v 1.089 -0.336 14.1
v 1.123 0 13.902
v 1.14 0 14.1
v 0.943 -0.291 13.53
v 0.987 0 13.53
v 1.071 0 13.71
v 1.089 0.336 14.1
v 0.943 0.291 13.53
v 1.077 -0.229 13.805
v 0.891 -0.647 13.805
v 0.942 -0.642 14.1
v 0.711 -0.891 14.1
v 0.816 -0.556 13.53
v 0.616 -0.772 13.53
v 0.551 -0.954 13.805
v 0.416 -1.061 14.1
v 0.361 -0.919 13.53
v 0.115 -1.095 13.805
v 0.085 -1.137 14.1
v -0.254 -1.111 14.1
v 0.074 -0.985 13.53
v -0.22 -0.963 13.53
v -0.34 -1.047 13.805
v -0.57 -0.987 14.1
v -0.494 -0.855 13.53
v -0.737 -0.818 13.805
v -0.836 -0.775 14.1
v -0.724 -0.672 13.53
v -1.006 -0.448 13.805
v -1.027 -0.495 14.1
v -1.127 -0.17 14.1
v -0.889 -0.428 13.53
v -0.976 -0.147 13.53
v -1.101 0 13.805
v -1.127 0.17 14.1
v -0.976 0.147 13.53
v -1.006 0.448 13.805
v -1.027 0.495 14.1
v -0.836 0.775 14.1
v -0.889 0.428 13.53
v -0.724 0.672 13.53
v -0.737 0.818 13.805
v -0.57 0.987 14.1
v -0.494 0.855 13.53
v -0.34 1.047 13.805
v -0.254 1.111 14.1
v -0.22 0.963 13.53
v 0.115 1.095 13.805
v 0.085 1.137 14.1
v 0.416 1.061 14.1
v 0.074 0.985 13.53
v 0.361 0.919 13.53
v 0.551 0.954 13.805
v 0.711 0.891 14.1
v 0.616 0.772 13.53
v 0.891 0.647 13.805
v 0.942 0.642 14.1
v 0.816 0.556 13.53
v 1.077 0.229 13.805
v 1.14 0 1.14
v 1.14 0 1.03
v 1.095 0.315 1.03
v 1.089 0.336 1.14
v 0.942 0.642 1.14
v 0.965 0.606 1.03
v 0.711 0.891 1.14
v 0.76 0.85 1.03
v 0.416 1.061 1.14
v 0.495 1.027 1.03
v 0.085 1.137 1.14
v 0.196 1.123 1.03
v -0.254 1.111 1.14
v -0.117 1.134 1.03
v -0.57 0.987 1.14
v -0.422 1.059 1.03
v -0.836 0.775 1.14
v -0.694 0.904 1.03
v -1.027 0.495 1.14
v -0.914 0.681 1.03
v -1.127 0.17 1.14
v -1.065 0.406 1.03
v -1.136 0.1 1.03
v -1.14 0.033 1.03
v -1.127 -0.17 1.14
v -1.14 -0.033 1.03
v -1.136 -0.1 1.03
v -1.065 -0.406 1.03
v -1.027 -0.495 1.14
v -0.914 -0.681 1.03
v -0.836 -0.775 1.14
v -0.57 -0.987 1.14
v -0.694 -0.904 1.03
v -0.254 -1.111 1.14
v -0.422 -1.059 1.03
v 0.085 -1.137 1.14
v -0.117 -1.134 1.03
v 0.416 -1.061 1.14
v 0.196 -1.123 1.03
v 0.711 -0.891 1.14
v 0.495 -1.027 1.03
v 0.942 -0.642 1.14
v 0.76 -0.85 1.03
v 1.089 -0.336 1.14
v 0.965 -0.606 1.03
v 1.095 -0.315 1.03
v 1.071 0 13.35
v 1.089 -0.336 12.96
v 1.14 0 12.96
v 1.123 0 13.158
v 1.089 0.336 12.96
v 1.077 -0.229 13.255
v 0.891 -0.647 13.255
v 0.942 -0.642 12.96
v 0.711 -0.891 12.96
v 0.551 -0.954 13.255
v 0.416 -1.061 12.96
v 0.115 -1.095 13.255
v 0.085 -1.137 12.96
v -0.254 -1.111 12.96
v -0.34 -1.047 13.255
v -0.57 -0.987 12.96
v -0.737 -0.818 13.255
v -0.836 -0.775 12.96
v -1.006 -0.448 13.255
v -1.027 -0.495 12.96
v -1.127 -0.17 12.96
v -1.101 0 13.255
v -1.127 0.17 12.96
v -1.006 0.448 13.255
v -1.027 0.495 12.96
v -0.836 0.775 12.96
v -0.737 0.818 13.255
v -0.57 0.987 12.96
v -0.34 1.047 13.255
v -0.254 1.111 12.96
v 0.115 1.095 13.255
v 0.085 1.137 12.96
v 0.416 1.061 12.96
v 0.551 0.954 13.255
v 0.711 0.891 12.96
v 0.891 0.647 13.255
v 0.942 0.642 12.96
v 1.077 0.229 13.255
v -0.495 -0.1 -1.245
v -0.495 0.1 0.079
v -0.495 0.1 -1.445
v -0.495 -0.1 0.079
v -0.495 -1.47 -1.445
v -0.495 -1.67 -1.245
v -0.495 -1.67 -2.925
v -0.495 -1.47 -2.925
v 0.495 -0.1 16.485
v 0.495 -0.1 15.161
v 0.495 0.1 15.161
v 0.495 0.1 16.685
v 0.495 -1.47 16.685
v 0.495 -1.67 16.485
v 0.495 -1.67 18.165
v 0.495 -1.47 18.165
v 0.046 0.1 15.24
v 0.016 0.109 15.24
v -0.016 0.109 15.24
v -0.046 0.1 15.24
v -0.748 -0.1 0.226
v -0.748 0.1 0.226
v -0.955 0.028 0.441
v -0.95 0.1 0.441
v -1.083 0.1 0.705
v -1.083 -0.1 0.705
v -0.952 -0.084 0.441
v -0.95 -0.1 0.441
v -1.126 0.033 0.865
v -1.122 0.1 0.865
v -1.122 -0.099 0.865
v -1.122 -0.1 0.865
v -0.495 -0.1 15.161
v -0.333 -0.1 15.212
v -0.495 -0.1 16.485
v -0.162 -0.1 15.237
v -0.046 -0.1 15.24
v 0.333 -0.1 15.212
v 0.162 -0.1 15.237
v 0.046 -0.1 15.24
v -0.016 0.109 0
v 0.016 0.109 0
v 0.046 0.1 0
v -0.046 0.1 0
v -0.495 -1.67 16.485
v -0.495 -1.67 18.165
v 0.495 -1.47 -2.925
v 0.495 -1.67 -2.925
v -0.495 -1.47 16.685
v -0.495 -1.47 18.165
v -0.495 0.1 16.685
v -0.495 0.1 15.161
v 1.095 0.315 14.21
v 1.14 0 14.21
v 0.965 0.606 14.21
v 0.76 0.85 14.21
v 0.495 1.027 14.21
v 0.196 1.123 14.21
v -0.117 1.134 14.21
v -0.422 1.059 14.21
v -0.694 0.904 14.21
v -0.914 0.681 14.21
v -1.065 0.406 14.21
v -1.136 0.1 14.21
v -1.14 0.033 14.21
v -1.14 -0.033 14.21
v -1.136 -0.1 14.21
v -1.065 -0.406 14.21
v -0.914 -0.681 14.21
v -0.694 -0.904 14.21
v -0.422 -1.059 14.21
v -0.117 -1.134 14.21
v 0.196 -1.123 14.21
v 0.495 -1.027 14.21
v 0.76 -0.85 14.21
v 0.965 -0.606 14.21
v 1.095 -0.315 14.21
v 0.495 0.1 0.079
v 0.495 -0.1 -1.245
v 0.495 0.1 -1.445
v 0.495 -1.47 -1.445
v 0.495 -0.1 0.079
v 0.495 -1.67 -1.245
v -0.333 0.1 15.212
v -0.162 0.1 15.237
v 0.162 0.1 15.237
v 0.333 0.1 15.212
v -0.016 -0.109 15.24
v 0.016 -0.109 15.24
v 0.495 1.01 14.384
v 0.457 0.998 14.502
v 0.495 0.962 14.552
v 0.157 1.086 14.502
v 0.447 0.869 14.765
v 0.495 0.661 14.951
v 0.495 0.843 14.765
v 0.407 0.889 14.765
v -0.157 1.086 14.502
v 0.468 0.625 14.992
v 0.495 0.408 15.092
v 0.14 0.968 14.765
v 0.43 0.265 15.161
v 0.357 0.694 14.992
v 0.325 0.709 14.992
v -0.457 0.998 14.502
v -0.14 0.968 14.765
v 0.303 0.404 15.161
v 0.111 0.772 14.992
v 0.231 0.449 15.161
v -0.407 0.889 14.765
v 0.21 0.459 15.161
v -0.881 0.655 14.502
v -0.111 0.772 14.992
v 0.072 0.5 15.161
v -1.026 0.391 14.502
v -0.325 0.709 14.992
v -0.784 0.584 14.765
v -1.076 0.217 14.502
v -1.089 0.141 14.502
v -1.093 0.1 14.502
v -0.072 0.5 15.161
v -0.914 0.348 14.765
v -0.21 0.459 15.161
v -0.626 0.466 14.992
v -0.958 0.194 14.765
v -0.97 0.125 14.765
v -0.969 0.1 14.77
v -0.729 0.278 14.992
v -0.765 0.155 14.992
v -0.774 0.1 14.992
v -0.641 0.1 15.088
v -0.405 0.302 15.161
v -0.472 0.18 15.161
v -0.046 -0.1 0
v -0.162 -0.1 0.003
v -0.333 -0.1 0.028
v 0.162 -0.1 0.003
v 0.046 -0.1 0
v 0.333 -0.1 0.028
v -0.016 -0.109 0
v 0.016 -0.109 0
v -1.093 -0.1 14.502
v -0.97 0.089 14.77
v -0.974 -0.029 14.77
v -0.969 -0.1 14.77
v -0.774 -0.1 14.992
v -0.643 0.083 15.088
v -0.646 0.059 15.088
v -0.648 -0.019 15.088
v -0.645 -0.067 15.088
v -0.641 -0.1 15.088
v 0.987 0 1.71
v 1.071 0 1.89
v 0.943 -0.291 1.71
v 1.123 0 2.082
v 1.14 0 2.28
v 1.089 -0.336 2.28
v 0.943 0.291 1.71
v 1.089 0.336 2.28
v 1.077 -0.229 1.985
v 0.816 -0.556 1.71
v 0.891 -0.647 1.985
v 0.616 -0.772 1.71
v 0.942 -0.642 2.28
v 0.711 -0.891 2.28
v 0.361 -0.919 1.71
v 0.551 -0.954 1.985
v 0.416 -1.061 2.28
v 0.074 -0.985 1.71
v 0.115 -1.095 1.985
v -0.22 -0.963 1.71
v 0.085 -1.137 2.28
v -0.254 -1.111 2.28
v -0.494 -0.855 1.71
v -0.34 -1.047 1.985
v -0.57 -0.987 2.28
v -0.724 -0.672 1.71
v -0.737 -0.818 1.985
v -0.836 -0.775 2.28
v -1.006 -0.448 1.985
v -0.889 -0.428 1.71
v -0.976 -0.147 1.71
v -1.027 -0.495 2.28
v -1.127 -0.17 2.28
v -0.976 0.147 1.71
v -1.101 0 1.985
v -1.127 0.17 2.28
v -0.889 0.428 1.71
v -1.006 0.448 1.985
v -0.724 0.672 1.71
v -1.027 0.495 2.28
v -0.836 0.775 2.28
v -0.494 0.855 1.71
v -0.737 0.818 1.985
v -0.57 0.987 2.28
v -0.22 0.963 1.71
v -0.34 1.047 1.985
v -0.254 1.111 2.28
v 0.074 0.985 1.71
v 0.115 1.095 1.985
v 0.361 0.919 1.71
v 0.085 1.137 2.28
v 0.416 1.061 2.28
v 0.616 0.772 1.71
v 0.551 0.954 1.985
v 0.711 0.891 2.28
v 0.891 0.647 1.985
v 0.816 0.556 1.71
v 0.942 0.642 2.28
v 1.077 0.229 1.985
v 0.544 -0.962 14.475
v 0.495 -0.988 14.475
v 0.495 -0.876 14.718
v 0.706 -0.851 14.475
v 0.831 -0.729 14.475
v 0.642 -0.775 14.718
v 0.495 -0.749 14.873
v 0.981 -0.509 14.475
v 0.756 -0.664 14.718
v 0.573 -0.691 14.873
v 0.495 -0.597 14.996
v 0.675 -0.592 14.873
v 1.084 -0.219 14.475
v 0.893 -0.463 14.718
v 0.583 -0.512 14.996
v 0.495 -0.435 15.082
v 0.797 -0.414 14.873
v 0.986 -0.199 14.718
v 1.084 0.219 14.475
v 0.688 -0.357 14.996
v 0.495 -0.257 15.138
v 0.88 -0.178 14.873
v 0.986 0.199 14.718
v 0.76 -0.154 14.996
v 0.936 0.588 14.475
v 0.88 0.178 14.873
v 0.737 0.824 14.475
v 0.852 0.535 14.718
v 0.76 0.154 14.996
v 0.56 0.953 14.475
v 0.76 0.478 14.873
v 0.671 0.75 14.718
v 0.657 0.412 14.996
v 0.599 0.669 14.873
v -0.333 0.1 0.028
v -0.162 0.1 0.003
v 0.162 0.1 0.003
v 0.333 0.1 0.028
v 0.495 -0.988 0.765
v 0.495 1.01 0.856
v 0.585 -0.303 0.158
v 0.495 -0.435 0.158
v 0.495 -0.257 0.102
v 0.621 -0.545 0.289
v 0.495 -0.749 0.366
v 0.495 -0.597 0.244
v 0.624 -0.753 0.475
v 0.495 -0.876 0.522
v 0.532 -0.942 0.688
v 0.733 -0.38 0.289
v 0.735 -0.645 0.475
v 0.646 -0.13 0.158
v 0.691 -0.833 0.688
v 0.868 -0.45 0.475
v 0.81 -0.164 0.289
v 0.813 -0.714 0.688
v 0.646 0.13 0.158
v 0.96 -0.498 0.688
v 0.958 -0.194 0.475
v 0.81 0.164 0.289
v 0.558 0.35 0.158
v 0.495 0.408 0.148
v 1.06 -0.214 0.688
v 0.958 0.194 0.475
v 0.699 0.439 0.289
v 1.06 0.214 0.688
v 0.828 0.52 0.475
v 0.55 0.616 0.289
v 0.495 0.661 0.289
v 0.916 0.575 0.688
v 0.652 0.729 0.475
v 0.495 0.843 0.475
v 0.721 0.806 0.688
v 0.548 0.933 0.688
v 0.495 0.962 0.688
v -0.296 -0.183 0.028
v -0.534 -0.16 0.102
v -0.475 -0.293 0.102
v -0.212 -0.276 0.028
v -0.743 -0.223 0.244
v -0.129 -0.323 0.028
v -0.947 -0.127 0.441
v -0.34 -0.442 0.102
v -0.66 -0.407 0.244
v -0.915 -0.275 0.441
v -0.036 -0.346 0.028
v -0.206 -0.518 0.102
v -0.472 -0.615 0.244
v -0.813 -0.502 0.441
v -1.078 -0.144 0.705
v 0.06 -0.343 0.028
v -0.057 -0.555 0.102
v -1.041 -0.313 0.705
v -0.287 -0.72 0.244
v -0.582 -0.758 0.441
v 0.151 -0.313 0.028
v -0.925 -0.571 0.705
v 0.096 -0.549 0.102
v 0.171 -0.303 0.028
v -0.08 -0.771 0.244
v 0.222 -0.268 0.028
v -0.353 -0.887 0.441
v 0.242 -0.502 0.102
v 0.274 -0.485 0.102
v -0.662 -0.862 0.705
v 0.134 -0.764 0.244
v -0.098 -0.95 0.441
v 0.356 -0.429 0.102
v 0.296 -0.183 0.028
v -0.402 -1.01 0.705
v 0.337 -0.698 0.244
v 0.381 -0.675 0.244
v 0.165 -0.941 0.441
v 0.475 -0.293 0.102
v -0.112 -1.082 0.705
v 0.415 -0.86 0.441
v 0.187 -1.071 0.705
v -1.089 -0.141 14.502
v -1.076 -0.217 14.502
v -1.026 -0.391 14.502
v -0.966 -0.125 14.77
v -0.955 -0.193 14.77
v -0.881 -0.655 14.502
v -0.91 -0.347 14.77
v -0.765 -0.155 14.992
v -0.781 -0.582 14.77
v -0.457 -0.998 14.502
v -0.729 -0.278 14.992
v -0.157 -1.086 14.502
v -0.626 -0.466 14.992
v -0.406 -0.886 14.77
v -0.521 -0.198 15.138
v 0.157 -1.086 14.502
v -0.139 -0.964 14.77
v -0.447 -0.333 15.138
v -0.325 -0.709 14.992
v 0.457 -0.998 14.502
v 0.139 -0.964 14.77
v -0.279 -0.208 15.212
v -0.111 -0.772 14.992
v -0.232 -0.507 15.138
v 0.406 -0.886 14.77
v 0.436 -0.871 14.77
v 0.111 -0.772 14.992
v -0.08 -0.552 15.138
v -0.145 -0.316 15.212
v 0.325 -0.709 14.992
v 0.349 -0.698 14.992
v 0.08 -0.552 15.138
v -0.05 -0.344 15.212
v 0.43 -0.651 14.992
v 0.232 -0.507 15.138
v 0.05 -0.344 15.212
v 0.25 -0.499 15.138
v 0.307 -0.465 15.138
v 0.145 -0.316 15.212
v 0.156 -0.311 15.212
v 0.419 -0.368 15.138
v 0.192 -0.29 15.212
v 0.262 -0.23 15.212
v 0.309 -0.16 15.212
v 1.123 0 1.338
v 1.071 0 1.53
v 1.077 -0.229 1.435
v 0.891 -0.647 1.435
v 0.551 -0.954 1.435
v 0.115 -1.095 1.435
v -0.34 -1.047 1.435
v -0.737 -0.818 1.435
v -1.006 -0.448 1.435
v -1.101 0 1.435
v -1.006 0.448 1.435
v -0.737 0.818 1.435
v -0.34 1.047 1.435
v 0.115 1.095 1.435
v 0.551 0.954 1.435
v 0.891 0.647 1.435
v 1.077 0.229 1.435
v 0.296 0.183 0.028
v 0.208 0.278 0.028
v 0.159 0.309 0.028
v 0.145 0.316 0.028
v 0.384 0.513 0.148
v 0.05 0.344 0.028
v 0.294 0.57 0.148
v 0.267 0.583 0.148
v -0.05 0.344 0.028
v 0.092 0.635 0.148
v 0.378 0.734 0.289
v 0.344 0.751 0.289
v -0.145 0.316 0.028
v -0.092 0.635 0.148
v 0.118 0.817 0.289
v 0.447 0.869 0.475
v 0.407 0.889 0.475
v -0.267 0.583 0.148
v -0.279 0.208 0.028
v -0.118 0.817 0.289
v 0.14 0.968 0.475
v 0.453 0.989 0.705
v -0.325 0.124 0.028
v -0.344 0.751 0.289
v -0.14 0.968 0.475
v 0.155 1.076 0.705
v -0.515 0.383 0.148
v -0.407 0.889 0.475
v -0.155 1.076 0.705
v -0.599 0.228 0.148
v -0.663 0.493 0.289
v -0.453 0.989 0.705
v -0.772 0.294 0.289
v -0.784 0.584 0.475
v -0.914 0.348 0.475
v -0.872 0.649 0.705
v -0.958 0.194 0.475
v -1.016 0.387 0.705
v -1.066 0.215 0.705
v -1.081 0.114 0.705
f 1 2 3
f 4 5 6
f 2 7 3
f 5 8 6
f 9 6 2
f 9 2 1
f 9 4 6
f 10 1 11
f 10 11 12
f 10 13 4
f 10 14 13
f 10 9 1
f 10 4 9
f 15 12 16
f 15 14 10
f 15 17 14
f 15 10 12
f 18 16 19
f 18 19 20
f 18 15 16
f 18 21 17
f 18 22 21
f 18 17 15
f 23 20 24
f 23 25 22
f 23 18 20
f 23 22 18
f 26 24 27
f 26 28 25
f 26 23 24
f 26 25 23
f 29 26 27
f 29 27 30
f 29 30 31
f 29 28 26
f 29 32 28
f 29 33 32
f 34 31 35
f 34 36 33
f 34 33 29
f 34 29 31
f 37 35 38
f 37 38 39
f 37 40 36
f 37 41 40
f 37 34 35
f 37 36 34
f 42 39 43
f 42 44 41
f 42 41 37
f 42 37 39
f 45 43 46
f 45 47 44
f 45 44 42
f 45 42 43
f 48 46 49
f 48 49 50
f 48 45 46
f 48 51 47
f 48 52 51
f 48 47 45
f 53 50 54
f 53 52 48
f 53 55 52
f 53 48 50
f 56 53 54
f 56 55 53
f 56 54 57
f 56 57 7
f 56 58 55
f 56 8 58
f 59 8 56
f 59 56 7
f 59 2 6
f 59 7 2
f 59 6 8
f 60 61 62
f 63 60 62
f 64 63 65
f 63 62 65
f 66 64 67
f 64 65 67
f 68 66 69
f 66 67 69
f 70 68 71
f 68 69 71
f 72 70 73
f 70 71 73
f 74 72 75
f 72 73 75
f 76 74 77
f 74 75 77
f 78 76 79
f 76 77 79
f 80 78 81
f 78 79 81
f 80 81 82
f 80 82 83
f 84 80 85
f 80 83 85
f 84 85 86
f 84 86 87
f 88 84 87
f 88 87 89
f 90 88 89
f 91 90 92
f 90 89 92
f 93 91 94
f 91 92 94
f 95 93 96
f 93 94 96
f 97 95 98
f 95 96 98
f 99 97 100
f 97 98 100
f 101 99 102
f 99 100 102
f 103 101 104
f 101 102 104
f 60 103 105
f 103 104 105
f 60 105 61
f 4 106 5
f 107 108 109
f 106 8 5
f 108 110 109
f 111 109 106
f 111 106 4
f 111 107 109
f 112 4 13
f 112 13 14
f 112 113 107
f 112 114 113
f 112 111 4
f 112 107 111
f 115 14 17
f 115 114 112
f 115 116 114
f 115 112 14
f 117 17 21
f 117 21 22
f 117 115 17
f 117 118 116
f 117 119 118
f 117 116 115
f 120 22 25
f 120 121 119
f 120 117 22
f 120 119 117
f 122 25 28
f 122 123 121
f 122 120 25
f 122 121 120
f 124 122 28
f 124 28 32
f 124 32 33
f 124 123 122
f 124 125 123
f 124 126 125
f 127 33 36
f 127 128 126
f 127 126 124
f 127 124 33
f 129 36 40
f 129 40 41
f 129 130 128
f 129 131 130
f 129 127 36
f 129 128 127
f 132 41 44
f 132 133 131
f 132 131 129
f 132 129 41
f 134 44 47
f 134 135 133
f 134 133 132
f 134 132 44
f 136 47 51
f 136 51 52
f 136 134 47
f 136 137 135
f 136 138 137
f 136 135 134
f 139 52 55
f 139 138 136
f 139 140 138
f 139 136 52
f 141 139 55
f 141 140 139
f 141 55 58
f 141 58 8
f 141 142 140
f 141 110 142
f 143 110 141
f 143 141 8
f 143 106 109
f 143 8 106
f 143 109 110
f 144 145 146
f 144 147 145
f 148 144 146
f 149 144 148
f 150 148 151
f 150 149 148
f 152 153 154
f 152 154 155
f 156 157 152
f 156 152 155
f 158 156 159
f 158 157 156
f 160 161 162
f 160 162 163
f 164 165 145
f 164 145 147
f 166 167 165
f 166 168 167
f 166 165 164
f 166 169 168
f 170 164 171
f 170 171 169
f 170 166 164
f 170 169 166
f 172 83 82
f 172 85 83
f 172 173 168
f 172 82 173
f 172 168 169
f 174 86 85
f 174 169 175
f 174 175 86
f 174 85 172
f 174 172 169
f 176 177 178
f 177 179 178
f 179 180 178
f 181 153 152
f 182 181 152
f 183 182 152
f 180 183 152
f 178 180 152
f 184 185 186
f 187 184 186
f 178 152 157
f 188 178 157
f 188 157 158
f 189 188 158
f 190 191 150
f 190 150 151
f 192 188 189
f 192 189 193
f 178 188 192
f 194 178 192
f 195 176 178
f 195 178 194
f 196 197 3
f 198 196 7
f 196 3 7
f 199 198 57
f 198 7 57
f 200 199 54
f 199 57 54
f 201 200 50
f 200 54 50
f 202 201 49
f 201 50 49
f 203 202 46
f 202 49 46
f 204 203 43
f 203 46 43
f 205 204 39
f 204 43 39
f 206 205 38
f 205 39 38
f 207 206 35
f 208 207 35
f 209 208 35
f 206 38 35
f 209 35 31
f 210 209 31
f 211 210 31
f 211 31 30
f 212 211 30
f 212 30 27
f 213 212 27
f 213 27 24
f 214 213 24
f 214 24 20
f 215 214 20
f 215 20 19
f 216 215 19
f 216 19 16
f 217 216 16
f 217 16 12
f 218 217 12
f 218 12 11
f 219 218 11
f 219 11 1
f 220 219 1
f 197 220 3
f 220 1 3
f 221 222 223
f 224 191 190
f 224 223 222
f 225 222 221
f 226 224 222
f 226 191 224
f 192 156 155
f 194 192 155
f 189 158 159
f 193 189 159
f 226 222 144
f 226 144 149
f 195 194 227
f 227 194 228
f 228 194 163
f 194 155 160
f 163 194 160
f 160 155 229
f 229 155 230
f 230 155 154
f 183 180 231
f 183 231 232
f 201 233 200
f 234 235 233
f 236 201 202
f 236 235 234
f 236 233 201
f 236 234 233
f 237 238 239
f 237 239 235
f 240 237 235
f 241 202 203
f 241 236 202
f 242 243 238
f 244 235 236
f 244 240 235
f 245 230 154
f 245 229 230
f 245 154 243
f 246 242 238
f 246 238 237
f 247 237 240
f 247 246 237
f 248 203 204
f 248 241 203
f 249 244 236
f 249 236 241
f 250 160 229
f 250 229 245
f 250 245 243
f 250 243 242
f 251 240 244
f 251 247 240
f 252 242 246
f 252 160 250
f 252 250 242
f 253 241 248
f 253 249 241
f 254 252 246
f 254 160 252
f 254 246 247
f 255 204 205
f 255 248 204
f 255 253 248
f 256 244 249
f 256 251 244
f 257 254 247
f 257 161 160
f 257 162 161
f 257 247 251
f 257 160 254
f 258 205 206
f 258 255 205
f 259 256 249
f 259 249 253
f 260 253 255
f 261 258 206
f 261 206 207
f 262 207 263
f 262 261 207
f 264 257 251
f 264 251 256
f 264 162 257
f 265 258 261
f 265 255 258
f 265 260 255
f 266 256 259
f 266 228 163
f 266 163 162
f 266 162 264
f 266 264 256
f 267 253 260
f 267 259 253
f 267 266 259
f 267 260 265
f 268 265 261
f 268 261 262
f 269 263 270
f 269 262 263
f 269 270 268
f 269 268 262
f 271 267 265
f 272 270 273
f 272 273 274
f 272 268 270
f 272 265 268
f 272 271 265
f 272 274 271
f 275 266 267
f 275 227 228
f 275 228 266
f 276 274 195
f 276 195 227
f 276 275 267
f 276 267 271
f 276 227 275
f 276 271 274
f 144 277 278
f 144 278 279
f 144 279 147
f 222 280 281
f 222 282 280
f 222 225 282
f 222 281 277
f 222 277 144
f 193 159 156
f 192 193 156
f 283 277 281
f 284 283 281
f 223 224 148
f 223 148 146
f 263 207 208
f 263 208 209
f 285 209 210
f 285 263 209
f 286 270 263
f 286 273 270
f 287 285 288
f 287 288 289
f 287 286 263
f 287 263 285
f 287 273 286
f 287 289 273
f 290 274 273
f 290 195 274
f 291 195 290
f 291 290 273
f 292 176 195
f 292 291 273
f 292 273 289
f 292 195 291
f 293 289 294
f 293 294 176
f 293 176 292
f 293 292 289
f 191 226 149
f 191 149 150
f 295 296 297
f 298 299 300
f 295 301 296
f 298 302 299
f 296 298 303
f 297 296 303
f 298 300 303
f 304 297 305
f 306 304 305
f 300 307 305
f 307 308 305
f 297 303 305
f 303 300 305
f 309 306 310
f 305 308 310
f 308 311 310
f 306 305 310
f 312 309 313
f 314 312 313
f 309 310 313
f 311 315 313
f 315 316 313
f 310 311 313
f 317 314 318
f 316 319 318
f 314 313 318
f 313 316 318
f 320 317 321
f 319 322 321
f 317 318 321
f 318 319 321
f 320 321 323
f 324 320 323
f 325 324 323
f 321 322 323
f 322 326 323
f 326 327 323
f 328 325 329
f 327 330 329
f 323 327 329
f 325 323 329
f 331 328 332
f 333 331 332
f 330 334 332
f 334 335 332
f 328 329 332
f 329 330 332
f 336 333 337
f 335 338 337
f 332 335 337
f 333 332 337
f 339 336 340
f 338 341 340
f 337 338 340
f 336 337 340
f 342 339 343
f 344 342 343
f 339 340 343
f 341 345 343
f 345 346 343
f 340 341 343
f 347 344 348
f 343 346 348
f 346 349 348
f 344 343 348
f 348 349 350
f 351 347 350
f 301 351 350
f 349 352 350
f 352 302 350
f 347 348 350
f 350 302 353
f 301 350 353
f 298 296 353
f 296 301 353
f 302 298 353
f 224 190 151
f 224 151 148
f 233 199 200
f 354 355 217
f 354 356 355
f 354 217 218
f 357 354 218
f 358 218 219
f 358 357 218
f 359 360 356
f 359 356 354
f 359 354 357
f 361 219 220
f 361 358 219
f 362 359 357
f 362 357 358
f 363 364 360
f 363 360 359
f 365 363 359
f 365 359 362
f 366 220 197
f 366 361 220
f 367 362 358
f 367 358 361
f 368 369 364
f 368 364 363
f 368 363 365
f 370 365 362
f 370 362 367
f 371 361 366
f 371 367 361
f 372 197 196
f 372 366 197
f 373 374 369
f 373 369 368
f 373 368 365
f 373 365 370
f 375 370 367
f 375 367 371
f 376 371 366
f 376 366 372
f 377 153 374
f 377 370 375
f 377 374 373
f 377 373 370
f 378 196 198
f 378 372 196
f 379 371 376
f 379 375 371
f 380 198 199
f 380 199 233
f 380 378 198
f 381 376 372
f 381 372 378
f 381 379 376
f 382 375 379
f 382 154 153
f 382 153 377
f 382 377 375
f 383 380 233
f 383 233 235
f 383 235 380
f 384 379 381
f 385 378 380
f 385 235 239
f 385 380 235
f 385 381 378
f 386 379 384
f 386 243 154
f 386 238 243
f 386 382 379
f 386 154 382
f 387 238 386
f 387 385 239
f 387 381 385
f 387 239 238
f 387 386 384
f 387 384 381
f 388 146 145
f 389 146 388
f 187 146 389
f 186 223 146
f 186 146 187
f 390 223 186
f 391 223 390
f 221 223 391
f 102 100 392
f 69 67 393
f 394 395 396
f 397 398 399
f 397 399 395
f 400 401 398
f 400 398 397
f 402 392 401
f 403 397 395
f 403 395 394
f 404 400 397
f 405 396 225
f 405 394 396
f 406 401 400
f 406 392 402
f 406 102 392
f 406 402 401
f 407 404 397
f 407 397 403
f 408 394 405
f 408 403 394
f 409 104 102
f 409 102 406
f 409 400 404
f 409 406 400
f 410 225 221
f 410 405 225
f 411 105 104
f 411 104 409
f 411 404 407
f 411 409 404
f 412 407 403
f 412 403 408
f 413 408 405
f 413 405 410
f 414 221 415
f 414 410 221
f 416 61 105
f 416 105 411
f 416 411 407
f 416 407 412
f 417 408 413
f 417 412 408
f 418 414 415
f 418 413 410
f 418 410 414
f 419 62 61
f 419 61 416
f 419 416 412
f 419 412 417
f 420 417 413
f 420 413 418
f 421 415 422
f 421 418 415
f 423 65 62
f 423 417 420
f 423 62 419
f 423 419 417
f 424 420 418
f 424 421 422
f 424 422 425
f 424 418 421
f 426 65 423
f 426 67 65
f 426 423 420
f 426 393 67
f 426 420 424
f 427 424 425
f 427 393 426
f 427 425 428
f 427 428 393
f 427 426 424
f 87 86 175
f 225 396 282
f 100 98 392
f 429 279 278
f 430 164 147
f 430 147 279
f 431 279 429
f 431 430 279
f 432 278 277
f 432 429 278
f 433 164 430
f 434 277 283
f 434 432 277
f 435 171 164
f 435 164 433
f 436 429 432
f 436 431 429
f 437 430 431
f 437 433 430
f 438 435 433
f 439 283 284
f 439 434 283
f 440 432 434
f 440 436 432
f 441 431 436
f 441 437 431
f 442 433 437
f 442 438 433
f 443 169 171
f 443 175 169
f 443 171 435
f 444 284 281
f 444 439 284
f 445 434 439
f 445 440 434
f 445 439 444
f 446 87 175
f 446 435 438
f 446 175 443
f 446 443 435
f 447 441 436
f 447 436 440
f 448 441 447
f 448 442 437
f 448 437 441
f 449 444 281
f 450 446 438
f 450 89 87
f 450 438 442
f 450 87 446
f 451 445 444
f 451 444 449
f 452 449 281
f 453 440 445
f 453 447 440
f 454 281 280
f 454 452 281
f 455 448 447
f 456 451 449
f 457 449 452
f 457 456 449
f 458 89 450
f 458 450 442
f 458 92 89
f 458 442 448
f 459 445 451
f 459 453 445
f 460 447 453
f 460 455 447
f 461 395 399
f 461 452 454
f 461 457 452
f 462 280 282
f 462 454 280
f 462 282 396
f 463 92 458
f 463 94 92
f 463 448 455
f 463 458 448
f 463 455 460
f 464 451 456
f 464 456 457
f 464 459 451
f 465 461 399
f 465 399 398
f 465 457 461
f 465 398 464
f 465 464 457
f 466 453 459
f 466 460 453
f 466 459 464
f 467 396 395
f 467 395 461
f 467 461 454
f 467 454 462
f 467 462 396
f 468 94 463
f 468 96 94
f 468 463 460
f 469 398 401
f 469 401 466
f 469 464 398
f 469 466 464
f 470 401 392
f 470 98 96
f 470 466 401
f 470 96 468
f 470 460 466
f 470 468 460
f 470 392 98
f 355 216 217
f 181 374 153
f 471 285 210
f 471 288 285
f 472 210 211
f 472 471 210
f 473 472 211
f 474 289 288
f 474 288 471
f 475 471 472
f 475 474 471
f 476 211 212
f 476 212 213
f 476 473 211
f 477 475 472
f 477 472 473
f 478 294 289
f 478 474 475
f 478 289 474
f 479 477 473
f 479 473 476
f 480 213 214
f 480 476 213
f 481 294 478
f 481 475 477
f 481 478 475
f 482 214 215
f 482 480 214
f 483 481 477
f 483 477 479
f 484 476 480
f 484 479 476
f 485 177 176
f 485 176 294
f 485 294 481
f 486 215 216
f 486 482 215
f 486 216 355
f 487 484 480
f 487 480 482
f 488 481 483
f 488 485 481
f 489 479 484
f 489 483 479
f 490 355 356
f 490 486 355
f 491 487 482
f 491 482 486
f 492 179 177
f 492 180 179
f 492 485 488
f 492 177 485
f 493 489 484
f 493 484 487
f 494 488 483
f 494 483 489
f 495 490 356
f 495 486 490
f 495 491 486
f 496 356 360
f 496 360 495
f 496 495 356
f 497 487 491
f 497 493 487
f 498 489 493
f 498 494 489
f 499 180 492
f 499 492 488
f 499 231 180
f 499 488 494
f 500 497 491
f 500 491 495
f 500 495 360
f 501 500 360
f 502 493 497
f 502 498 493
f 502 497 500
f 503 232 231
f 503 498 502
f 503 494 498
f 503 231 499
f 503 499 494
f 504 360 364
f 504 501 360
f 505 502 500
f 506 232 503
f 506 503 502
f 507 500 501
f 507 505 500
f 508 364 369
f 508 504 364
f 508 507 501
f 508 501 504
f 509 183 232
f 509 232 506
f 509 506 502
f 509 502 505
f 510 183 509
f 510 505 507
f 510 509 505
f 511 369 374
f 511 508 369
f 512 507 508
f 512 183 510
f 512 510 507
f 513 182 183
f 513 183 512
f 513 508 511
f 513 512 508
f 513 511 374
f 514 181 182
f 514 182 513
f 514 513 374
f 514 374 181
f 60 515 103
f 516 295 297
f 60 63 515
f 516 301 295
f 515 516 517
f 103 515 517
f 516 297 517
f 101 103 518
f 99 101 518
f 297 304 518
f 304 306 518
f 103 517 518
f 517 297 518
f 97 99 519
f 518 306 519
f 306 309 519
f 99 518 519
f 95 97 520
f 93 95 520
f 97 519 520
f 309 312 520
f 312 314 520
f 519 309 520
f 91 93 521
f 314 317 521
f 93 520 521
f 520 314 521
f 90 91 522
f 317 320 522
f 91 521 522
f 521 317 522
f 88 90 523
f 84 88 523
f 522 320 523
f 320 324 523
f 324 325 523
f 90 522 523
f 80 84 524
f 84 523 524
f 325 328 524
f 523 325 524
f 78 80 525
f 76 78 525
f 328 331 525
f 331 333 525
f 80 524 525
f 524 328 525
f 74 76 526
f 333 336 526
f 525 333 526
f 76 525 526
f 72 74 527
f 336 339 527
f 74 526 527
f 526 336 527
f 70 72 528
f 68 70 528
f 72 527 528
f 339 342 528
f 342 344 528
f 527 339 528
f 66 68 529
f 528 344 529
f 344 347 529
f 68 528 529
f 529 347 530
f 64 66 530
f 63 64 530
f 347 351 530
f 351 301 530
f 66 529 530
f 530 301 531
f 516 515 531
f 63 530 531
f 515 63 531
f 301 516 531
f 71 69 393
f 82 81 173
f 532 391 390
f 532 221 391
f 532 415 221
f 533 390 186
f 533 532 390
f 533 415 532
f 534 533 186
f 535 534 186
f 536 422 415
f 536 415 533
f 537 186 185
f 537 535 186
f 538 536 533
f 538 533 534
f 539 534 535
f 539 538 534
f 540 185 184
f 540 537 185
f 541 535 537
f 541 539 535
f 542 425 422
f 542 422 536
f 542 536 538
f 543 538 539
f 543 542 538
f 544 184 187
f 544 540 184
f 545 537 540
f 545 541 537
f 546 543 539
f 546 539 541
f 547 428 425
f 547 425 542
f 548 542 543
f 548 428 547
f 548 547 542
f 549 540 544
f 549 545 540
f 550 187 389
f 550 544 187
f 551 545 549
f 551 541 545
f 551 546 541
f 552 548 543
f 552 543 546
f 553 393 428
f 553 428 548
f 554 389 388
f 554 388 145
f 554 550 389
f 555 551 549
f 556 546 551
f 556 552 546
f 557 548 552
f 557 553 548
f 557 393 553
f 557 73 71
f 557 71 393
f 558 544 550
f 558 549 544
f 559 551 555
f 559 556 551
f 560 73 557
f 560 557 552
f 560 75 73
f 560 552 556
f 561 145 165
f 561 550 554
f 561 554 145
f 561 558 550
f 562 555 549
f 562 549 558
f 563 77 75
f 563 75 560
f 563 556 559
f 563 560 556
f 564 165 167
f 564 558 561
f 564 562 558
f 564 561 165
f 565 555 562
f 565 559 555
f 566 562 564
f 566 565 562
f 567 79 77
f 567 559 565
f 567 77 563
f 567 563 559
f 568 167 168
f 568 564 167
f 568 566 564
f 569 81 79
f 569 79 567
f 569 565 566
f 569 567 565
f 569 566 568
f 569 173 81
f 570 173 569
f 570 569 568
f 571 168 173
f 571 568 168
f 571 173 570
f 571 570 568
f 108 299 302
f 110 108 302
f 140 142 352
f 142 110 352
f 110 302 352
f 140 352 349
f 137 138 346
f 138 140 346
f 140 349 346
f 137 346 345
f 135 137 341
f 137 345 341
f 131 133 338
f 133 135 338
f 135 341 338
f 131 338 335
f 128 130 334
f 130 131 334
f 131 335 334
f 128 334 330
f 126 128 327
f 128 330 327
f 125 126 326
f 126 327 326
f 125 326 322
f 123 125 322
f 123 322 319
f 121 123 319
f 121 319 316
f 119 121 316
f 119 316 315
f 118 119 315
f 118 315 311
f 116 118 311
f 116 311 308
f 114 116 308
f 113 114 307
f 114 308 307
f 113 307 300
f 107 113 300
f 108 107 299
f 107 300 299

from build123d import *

# Parameters (mm, degrees)
SKETCH1_R        = 1.14
EXTRUSION1_DEPTH = 15.24
EXTRUSION2_DEPTH = 0.495
FILLET3_R        = 1.03


with BuildPart() as part:
    # Sketch1 → Extrusion1 (new body)
    with BuildSketch(Plane.XY):
        Circle(SKETCH1_R)
    extrude(amount=EXTRUSION1_DEPTH)

    # Sketch3 → Revolution3 (revolve, cut)
    with BuildSketch(Plane.YZ, mode=Mode.PRIVATE) as revolution3_sk:
        with BuildLine():
            Line((1.14, 12.96), (1.14, 14.1))
            ThreePointArc((1.14, 14.1), (1.101155442, 13.804946289), (0.98726896, 13.53))
            ThreePointArc((0.98726896, 13.53), (1.101155442, 13.255053711), (1.14, 12.96))
        make_face()
    revolution3 = revolve(revolution3_sk.sketch.rotate(Axis((0, 0, 14.1), (0, 0, -1)), 90), axis=Axis((0, 0, 14.1), (0, 0, -1)), mode=Mode.SUBTRACT)

    # Mirror2: Revolution3 across plane
    add(revolution3.mirror(Plane.XY.offset(7.62)), mode=Mode.SUBTRACT)

    # Sketch4 → Extrusion2 (add, symmetric)
    with BuildSketch(Plane.YZ):
        with BuildLine():
            Line((-0.1, 0), (0, 0))
            ThreePointArc((0, 0), (-0.050048254, 0.001099138), (-0.1, 0.004394435))
            Line((-0.1, 0.004394435), (-0.1, 0))
        make_face()
        with BuildLine():
            ThreePointArc((0, 0), (0.050048254, 0.001099138), (0.1, 0.004394435))
            Line((0.1, 0.004394435), (0.1, 0.138771336))
            Line((0.1, 0.138771336), (-0.1, 0.138771336))
            Line((-0.1, 0.138771336), (-0.1, 0.004394435))
            ThreePointArc((-0.1, 0.004394435), (-0.050048254, 0.001099138), (0, 0))
        make_face()
        Polygon((0.1, -1.445), (0.1, 0), (0, 0), (-0.1, 0), (-0.1, -1.245), (-1.67, -1.245), (-1.67, -2.925), (-1.47, -2.925), (-1.47, -1.445), align=None)
    extrusion2 = extrude(amount=EXTRUSION2_DEPTH, both=True)

    # Mirror3: Extrusion2 across plane
    add(extrusion2.mirror(Plane.XY.offset(7.62)))

    # Fillet3
    # the kernel refuses this fillet: 1.03 mm, written as the material it takes off along each edge
    with BuildSketch(Plane(origin=(0, 0, 15.24), x_dir=(1, 0, 0), z_dir=(0, -1, 0))) as fillet3_piece_1_section:
        with BuildLine():
            CenterArc((1.14 - FILLET3_R, -FILLET3_R), FILLET3_R, 0, 90)
            Line((1.14 - FILLET3_R, 0), (1.14, 0))
            Line((1.14, 0), (1.14, -FILLET3_R))
        make_face()
    fillet3_piece_1 = revolve(axis=Axis((0, 0, 15.24), (0, 0, 1)), mode=Mode.PRIVATE)
    fillet3_piece_1 = split(fillet3_piece_1, bisect_by=Plane(origin=(0.495, 4e-09, 15.000808078), z_dir=(1, 0, 0)), keep=Keep.TOP, mode=Mode.PRIVATE)
    add(fillet3_piece_1, mode=Mode.SUBTRACT)
    with BuildSketch(Plane(origin=(0, 0, 15.24), x_dir=(1, 0, 0), z_dir=(0, -1, 0))) as fillet3_piece_2_section:
        with BuildLine():
            CenterArc((1.14 - FILLET3_R, -FILLET3_R), FILLET3_R, 0, 90)
            Line((1.14 - FILLET3_R, 0), (1.14, 0))
            Line((1.14, 0), (1.14, -FILLET3_R))
        make_face()
    fillet3_piece_2 = revolve(axis=Axis((0, 0, 15.24), (0, 0, 1)), mode=Mode.PRIVATE)
    fillet3_piece_2 = split(fillet3_piece_2, bisect_by=Plane(origin=(0, 0.1, 15.013614208), z_dir=(0, 1, 0)), keep=Keep.TOP, mode=Mode.PRIVATE)
    add(fillet3_piece_2, mode=Mode.SUBTRACT)
    with BuildSketch(Plane(origin=(0, 0, 15.24), x_dir=(1, 0, 0), z_dir=(0, -1, 0))) as fillet3_piece_3_section:
        with BuildLine():
            CenterArc((1.14 - FILLET3_R, -FILLET3_R), FILLET3_R, 0, 90)
            Line((1.14 - FILLET3_R, 0), (1.14, 0))
            Line((1.14, 0), (1.14, -FILLET3_R))
        make_face()
    fillet3_piece_3 = revolve(axis=Axis((0, 0, 15.24), (0, 0, 1)), mode=Mode.PRIVATE)
    fillet3_piece_3 = split(fillet3_piece_3, bisect_by=Plane(origin=(8e-09, -0.1, 15.013614602), z_dir=(0, -1, 0)), keep=Keep.TOP, mode=Mode.PRIVATE)
    add(fillet3_piece_3, mode=Mode.SUBTRACT)
    with BuildSketch(Plane(origin=(0, 0, 15.24), x_dir=(1, 0, 0), z_dir=(0, -1, 0))) as fillet3_piece_4_section:
        with BuildLine():
            CenterArc((1.14 - FILLET3_R, -FILLET3_R), FILLET3_R, 0, 90)
            Line((1.14 - FILLET3_R, 0), (1.14, 0))
            Line((1.14, 0), (1.14, -FILLET3_R))
        make_face()
    fillet3_piece_4 = revolve(axis=Axis((0, 0, 15.24), (0, 0, 1)), mode=Mode.PRIVATE)
    fillet3_piece_4 = split(fillet3_piece_4, bisect_by=Plane(origin=(-0.495, -1e-09, 15.000807979), z_dir=(-1, 0, 0)), keep=Keep.TOP, mode=Mode.PRIVATE)
    add(fillet3_piece_4, mode=Mode.SUBTRACT)
    with BuildSketch(Plane(origin=(0, 0, 0), x_dir=(1, 0, 0), z_dir=(0, -1, 0))) as fillet3_piece_5_section:
        with BuildLine():
            CenterArc((1.14 - FILLET3_R, FILLET3_R), FILLET3_R, 270, 90)
            Line((1.14 - FILLET3_R, 0), (1.14, 0))
            Line((1.14, 0), (1.14, FILLET3_R))
        make_face()
    fillet3_piece_5 = revolve(axis=Axis((0, 0, 0), (0, 0, 1)), mode=Mode.PRIVATE)
    fillet3_piece_5 = split(fillet3_piece_5, bisect_by=Plane(origin=(0.495, 4e-09, 0.239191922), z_dir=(1, 0, 0)), keep=Keep.TOP, mode=Mode.PRIVATE)
    add(fillet3_piece_5, mode=Mode.SUBTRACT)
    with BuildSketch(Plane(origin=(0, 0, 0), x_dir=(1, 0, 0), z_dir=(0, -1, 0))) as fillet3_piece_6_section:
        with BuildLine():
            CenterArc((1.14 - FILLET3_R, FILLET3_R), FILLET3_R, 270, 90)
            Line((1.14 - FILLET3_R, 0), (1.14, 0))
            Line((1.14, 0), (1.14, FILLET3_R))
        make_face()
    fillet3_piece_6 = revolve(axis=Axis((0, 0, 0), (0, 0, 1)), mode=Mode.PRIVATE)
    fillet3_piece_6 = split(fillet3_piece_6, bisect_by=Plane(origin=(0, 0.1, 0.226385792), z_dir=(0, 1, 0)), keep=Keep.TOP, mode=Mode.PRIVATE)
    add(fillet3_piece_6, mode=Mode.SUBTRACT)
    with BuildSketch(Plane(origin=(0, 0, 0), x_dir=(1, 0, 0), z_dir=(0, -1, 0))) as fillet3_piece_7_section:
        with BuildLine():
            CenterArc((1.14 - FILLET3_R, FILLET3_R), FILLET3_R, 270, 90)
            Line((1.14 - FILLET3_R, 0), (1.14, 0))
            Line((1.14, 0), (1.14, FILLET3_R))
        make_face()
    fillet3_piece_7 = revolve(axis=Axis((0, 0, 0), (0, 0, 1)), mode=Mode.PRIVATE)
    fillet3_piece_7 = split(fillet3_piece_7, bisect_by=Plane(origin=(8e-09, -0.1, 0.226385398), z_dir=(0, -1, 0)), keep=Keep.TOP, mode=Mode.PRIVATE)
    add(fillet3_piece_7, mode=Mode.SUBTRACT)
    with BuildSketch(Plane(origin=(0, 0, 0), x_dir=(1, 0, 0), z_dir=(0, -1, 0))) as fillet3_piece_8_section:
        with BuildLine():
            CenterArc((1.14 - FILLET3_R, FILLET3_R), FILLET3_R, 270, 90)
            Line((1.14 - FILLET3_R, 0), (1.14, 0))
            Line((1.14, 0), (1.14, FILLET3_R))
        make_face()
    fillet3_piece_8 = revolve(axis=Axis((0, 0, 0), (0, 0, 1)), mode=Mode.PRIVATE)
    fillet3_piece_8 = split(fillet3_piece_8, bisect_by=Plane(origin=(-0.495, -1e-09, 0.239192021), z_dir=(-1, 0, 0)), keep=Keep.TOP, mode=Mode.PRIVATE)
    add(fillet3_piece_8, mode=Mode.SUBTRACT)


solid = part.part
